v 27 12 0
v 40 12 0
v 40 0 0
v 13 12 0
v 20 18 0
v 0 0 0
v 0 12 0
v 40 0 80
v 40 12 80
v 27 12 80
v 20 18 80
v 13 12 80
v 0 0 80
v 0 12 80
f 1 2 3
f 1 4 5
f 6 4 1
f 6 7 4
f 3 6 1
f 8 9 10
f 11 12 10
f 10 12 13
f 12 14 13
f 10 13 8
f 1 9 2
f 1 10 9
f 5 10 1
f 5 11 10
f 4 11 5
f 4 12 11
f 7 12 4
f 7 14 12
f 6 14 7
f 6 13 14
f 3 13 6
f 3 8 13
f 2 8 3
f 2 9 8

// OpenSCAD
$fn = 32;

// ----------------------------------------------------------------------
// V guide rail: vrib, 40 mm wide
// ----------------------------------------------------------------------

// --- parameters (mm) ---
rail_w = 40;              // rail width, X
base_t = 12;              // base plate thickness
v_depth = 6;              // V feature depth / height
v_half_w = 7;             // half width of the V at the base face
plate_t = 80;             // rail length, Z (the extrusion height)
fit_tol = 0.05;           // declared fit tolerance (prompt contract)
free_tol = 0.3;           // declared free tolerance (prompt contract)

profile = [[0, 0], [40, 0], [40, 12], [27, 12], [20, 18], [13, 12], [0, 12]];  // primary outline, 7 points, counter clockwise

// --- the one profile operation ---
linear_extrude(height = plate_t) polygon(points = profile);
